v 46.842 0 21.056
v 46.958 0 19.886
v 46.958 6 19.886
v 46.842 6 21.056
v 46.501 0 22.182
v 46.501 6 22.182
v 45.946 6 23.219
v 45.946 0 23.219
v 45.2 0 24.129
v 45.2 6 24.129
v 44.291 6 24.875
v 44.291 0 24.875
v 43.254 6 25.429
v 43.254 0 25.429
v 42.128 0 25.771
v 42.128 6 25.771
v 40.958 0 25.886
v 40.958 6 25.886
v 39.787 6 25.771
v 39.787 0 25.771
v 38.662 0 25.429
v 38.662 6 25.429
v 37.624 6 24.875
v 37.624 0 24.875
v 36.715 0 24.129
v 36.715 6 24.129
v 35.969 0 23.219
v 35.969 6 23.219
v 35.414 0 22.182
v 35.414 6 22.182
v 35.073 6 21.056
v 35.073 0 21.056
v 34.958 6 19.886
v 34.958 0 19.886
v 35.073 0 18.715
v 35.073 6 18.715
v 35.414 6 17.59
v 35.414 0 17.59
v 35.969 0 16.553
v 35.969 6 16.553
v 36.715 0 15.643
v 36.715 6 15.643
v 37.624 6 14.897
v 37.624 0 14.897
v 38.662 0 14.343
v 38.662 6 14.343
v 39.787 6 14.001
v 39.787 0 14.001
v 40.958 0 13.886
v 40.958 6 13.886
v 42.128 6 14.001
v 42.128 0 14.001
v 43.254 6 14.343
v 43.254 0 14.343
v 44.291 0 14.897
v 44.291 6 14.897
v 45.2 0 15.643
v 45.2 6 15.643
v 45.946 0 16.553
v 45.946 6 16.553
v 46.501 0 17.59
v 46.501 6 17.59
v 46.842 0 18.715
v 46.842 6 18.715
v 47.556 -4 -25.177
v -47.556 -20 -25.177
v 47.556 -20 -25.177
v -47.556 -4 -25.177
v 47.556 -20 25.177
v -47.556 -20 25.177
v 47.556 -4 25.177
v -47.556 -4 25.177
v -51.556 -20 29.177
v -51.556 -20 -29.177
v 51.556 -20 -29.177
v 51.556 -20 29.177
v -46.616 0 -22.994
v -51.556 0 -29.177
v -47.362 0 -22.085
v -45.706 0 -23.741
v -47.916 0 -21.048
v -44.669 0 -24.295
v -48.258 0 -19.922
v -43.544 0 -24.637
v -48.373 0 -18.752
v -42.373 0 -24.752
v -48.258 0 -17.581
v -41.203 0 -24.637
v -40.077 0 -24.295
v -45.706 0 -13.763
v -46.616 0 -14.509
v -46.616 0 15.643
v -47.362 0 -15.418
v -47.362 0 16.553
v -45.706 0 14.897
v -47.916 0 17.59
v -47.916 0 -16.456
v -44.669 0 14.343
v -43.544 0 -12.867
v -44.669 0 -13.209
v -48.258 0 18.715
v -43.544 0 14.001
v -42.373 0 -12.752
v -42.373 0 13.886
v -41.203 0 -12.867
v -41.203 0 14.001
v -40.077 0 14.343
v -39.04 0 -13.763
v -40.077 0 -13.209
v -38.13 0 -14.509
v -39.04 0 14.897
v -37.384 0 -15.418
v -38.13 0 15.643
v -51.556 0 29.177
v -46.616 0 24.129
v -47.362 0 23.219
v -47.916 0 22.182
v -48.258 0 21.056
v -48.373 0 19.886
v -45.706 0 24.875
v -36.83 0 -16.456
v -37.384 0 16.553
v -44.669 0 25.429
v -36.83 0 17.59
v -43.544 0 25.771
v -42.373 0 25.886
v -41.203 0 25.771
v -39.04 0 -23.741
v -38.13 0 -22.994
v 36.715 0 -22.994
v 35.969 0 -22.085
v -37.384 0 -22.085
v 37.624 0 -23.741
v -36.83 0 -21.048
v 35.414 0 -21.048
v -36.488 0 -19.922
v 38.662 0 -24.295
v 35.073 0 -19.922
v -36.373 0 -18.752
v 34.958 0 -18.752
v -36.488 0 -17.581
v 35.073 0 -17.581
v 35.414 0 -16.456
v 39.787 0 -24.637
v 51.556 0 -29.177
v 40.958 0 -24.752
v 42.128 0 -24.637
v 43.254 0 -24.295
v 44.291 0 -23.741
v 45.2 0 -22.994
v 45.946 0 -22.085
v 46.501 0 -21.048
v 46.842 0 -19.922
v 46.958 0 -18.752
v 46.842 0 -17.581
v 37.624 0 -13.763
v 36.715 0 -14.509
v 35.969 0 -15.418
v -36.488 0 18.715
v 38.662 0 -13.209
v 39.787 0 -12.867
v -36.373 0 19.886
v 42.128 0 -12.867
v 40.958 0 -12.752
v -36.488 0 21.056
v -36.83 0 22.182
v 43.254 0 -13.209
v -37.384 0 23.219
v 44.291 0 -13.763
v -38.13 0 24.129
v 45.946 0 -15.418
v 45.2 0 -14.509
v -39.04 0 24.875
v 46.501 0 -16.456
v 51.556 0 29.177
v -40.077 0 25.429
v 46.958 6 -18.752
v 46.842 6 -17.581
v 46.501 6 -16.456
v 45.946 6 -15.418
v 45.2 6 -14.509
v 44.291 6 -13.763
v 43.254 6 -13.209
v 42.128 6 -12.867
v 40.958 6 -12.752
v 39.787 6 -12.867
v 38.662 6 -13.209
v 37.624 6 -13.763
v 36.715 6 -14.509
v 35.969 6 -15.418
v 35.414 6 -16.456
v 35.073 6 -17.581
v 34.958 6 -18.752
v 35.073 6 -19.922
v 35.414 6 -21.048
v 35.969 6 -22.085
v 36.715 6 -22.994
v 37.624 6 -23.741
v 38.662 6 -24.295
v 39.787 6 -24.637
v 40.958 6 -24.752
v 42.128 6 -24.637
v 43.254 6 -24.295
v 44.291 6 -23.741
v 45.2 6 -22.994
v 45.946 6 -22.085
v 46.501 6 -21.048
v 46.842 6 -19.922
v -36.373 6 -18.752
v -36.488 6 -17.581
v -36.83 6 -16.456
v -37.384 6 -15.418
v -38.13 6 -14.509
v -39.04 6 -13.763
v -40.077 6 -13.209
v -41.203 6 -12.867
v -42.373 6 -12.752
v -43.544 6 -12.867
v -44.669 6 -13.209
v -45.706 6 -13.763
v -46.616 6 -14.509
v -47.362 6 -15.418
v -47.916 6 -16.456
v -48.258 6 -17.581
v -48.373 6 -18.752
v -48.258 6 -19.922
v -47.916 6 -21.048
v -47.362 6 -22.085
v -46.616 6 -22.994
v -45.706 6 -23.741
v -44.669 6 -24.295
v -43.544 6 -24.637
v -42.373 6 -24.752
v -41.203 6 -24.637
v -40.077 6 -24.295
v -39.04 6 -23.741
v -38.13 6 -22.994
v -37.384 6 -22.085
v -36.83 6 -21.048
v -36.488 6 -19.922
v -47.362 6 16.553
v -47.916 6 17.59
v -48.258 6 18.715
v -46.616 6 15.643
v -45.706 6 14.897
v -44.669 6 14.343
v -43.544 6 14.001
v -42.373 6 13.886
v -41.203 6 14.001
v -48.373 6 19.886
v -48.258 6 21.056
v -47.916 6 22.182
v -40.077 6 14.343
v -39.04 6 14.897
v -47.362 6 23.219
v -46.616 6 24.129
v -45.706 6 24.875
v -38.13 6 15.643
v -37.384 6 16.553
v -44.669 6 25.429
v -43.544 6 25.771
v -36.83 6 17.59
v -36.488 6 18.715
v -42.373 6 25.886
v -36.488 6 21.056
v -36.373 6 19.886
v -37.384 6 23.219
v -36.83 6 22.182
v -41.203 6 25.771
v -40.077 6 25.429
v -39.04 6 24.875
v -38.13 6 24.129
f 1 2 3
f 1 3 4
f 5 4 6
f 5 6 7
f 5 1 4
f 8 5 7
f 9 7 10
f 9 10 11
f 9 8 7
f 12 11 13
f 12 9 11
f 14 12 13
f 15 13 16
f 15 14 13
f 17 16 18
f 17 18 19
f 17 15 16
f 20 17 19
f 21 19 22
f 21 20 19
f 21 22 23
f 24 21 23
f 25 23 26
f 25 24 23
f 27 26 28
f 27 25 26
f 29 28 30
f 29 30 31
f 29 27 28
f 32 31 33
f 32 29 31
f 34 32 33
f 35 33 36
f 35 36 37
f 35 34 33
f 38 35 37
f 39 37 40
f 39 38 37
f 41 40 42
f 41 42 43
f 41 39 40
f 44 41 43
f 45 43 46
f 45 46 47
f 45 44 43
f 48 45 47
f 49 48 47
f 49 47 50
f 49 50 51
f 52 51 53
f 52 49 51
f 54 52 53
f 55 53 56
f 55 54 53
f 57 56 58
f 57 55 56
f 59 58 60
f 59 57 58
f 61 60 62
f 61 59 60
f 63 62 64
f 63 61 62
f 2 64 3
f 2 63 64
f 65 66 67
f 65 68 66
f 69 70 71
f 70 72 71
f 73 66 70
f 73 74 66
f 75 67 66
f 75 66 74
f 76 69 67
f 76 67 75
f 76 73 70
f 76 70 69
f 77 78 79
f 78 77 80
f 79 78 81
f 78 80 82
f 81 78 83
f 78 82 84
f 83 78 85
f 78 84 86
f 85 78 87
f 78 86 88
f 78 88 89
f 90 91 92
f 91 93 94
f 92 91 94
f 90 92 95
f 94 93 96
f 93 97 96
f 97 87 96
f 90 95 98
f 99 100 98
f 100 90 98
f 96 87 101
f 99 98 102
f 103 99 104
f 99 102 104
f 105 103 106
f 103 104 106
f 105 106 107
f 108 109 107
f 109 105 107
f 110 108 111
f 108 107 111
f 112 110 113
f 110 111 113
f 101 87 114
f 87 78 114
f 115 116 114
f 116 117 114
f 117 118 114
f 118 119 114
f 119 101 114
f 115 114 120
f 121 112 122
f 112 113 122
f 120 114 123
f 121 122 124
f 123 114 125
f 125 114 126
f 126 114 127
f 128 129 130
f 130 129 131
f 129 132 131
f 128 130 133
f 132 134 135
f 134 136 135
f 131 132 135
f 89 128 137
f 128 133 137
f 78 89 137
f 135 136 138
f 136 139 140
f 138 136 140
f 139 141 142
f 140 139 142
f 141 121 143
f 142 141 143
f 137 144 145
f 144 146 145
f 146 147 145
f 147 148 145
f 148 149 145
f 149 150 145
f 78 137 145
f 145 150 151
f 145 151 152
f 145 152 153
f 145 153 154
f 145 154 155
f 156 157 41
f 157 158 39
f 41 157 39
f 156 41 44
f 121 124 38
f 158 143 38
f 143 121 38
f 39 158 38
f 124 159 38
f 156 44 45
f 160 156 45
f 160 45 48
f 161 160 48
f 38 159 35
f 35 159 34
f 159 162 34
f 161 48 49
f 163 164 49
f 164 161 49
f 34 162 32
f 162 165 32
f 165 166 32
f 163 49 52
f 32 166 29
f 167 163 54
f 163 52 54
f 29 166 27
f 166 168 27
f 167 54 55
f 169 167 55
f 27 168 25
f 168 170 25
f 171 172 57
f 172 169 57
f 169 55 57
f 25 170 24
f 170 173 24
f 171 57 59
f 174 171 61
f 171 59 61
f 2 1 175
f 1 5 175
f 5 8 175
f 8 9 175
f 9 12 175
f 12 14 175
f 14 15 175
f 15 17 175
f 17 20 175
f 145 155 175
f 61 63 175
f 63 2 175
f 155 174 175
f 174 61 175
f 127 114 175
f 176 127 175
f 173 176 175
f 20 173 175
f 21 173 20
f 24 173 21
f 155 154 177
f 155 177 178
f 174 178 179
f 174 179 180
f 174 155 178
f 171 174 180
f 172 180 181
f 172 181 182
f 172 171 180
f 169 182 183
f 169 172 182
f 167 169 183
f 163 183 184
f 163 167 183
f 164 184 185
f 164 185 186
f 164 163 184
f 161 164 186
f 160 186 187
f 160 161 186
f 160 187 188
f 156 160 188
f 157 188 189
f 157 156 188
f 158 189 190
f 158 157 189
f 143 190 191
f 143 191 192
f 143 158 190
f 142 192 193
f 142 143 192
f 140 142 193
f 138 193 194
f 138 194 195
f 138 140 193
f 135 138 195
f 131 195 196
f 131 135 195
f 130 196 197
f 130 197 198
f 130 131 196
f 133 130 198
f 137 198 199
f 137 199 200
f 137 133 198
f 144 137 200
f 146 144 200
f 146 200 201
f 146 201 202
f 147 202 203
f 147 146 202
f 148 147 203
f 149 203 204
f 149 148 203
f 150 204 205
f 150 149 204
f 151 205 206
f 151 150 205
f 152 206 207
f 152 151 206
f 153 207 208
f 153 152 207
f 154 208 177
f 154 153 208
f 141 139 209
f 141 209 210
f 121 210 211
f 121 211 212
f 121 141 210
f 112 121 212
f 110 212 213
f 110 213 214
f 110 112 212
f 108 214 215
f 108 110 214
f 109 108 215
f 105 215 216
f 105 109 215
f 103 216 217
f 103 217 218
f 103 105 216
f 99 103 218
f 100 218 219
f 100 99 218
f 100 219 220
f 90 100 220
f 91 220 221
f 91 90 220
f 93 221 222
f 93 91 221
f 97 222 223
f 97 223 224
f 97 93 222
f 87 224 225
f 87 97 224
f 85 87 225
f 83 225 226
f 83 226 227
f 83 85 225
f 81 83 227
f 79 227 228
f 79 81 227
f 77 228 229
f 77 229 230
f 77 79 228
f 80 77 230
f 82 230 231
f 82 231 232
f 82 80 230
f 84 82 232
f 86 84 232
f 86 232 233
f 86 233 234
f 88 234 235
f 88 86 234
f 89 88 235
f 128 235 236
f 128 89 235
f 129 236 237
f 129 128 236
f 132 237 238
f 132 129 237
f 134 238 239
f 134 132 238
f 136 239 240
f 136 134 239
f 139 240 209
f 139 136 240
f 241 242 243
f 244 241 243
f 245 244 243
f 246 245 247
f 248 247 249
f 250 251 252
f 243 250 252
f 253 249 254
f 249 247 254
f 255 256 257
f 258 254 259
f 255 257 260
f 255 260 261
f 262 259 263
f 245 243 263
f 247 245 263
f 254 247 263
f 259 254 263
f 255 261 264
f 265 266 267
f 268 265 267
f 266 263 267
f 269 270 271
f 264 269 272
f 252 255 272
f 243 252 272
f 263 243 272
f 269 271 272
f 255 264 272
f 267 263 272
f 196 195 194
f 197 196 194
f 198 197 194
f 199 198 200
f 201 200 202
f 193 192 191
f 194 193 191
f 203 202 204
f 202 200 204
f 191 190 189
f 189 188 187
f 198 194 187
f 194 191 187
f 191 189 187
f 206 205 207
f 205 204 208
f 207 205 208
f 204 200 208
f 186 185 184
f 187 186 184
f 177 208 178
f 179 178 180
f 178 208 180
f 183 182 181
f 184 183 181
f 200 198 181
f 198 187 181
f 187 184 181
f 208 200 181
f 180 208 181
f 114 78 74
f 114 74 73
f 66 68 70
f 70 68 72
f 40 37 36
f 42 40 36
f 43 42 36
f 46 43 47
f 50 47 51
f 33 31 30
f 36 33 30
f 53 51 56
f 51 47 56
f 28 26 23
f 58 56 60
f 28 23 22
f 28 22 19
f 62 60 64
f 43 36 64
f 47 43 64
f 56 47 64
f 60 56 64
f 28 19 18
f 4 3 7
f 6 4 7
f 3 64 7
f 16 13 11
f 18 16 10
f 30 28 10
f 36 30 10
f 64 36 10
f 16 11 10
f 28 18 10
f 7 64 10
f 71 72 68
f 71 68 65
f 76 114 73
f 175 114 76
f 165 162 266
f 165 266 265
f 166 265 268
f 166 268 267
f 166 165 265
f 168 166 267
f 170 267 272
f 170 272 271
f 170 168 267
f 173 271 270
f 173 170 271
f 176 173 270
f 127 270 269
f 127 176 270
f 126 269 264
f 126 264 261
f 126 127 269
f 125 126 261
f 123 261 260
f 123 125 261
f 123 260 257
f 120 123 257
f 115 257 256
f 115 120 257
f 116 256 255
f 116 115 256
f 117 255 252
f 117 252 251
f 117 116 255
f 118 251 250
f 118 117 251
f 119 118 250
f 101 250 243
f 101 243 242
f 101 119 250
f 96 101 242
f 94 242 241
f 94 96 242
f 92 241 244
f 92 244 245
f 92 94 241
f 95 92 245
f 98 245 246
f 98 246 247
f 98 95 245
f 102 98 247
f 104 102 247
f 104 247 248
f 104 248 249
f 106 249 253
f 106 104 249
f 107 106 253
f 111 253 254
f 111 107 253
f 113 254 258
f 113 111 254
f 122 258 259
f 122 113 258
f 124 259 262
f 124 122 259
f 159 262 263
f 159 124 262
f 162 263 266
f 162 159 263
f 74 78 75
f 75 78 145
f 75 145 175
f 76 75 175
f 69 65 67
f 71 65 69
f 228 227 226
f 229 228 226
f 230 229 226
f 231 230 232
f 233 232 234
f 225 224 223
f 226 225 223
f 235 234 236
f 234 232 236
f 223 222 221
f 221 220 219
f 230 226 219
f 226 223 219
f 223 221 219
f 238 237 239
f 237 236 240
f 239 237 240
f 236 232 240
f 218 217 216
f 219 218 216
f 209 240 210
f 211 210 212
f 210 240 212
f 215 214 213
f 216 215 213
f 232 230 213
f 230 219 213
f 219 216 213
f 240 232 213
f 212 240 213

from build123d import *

# Parameters (mm, degrees)
F0_W     = 103.111512
F0_H     = 58.354322
F1_DEPTH = 20
F2_T     = -4
F3_R     = 6
F4_DEPTH = 6


with BuildPart() as f1:
    # F0 (on Front) → F1 (new body)
    with BuildSketch(Plane.XZ):
        Rectangle(F0_W, F0_H)
    extrude(amount=F1_DEPTH)

    # F2
    f2_openings = [f1.faces().sort_by_distance(p)[0] for p in [
        (0, -20, 0),
    ]]
    offset(amount=F2_T, openings=f2_openings)

    # F3 (on Front) → F4 (join)
    with BuildSketch(Plane.XZ):
        with Locations((-42.373065, -18.751857)):
            Circle(F3_R)
        with Locations((40.957681, -18.751857)):
            Circle(F3_R)
        with Locations((40.957681, 19.885929)):
            Circle(F3_R)
        with Locations((-42.373065, 19.885929)):
            Circle(F3_R)
    extrude(amount=-F4_DEPTH)


solid = f1.part
